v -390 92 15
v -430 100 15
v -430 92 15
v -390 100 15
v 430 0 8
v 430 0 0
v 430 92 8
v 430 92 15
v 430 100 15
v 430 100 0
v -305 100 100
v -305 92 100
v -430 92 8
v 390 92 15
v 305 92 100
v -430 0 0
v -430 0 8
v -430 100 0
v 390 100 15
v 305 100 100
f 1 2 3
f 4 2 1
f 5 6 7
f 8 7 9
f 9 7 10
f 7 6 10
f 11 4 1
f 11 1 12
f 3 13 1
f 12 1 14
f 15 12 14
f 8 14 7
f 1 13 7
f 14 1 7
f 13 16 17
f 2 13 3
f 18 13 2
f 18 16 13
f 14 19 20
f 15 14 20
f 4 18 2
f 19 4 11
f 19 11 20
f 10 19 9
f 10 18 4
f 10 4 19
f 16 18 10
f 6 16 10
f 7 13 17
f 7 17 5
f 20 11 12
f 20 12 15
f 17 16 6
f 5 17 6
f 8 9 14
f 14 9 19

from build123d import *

# Parameters (mm, degrees)
SKETCH_1_W          = 860
SKETCH_1_H          = 100
EXTRUDE_1_DEPTH     = 8
SKETCH_2_W          = 860
SKETCH_2_H          = 8
EXTRUDE_2_DEPTH     = 92
CUT_EXTRUDE_1_DEPTH = 453.65881191


with BuildPart() as part:
    # 草图1 → 凸台-拉伸1 (new body)
    with BuildSketch(Plane.XY):
        with Locations((0, 50)):
            Rectangle(SKETCH_1_W, SKETCH_1_H)
    extrude(amount=EXTRUDE_1_DEPTH)

    # 草图2 → 凸台-拉伸2 (add)
    with BuildSketch(Plane.XY.offset(8)):
        with Locations((0, 96)):
            Rectangle(SKETCH_2_W, SKETCH_2_H)
    extrude(amount=EXTRUDE_2_DEPTH)

    # 草图4 → 切除-拉伸1 (cut, through all)
    with BuildSketch(Plane(origin=(0, 100, 0), x_dir=(1, 0, 0), z_dir=(0, 1, 0))):
        Polygon((-430, -15), (-390, -15), (-305, -100), (-430, -100), align=None)
    cut_extrude_1 = extrude(amount=-CUT_EXTRUDE_1_DEPTH, mode=Mode.SUBTRACT)

    # 镜向1: 切除-拉伸1 across plane
    add(cut_extrude_1.mirror(Plane(origin=(0, 0, 0), x_dir=(0, 0, 1), z_dir=(1, 0, 0))), mode=Mode.SUBTRACT)


solid = part.part
